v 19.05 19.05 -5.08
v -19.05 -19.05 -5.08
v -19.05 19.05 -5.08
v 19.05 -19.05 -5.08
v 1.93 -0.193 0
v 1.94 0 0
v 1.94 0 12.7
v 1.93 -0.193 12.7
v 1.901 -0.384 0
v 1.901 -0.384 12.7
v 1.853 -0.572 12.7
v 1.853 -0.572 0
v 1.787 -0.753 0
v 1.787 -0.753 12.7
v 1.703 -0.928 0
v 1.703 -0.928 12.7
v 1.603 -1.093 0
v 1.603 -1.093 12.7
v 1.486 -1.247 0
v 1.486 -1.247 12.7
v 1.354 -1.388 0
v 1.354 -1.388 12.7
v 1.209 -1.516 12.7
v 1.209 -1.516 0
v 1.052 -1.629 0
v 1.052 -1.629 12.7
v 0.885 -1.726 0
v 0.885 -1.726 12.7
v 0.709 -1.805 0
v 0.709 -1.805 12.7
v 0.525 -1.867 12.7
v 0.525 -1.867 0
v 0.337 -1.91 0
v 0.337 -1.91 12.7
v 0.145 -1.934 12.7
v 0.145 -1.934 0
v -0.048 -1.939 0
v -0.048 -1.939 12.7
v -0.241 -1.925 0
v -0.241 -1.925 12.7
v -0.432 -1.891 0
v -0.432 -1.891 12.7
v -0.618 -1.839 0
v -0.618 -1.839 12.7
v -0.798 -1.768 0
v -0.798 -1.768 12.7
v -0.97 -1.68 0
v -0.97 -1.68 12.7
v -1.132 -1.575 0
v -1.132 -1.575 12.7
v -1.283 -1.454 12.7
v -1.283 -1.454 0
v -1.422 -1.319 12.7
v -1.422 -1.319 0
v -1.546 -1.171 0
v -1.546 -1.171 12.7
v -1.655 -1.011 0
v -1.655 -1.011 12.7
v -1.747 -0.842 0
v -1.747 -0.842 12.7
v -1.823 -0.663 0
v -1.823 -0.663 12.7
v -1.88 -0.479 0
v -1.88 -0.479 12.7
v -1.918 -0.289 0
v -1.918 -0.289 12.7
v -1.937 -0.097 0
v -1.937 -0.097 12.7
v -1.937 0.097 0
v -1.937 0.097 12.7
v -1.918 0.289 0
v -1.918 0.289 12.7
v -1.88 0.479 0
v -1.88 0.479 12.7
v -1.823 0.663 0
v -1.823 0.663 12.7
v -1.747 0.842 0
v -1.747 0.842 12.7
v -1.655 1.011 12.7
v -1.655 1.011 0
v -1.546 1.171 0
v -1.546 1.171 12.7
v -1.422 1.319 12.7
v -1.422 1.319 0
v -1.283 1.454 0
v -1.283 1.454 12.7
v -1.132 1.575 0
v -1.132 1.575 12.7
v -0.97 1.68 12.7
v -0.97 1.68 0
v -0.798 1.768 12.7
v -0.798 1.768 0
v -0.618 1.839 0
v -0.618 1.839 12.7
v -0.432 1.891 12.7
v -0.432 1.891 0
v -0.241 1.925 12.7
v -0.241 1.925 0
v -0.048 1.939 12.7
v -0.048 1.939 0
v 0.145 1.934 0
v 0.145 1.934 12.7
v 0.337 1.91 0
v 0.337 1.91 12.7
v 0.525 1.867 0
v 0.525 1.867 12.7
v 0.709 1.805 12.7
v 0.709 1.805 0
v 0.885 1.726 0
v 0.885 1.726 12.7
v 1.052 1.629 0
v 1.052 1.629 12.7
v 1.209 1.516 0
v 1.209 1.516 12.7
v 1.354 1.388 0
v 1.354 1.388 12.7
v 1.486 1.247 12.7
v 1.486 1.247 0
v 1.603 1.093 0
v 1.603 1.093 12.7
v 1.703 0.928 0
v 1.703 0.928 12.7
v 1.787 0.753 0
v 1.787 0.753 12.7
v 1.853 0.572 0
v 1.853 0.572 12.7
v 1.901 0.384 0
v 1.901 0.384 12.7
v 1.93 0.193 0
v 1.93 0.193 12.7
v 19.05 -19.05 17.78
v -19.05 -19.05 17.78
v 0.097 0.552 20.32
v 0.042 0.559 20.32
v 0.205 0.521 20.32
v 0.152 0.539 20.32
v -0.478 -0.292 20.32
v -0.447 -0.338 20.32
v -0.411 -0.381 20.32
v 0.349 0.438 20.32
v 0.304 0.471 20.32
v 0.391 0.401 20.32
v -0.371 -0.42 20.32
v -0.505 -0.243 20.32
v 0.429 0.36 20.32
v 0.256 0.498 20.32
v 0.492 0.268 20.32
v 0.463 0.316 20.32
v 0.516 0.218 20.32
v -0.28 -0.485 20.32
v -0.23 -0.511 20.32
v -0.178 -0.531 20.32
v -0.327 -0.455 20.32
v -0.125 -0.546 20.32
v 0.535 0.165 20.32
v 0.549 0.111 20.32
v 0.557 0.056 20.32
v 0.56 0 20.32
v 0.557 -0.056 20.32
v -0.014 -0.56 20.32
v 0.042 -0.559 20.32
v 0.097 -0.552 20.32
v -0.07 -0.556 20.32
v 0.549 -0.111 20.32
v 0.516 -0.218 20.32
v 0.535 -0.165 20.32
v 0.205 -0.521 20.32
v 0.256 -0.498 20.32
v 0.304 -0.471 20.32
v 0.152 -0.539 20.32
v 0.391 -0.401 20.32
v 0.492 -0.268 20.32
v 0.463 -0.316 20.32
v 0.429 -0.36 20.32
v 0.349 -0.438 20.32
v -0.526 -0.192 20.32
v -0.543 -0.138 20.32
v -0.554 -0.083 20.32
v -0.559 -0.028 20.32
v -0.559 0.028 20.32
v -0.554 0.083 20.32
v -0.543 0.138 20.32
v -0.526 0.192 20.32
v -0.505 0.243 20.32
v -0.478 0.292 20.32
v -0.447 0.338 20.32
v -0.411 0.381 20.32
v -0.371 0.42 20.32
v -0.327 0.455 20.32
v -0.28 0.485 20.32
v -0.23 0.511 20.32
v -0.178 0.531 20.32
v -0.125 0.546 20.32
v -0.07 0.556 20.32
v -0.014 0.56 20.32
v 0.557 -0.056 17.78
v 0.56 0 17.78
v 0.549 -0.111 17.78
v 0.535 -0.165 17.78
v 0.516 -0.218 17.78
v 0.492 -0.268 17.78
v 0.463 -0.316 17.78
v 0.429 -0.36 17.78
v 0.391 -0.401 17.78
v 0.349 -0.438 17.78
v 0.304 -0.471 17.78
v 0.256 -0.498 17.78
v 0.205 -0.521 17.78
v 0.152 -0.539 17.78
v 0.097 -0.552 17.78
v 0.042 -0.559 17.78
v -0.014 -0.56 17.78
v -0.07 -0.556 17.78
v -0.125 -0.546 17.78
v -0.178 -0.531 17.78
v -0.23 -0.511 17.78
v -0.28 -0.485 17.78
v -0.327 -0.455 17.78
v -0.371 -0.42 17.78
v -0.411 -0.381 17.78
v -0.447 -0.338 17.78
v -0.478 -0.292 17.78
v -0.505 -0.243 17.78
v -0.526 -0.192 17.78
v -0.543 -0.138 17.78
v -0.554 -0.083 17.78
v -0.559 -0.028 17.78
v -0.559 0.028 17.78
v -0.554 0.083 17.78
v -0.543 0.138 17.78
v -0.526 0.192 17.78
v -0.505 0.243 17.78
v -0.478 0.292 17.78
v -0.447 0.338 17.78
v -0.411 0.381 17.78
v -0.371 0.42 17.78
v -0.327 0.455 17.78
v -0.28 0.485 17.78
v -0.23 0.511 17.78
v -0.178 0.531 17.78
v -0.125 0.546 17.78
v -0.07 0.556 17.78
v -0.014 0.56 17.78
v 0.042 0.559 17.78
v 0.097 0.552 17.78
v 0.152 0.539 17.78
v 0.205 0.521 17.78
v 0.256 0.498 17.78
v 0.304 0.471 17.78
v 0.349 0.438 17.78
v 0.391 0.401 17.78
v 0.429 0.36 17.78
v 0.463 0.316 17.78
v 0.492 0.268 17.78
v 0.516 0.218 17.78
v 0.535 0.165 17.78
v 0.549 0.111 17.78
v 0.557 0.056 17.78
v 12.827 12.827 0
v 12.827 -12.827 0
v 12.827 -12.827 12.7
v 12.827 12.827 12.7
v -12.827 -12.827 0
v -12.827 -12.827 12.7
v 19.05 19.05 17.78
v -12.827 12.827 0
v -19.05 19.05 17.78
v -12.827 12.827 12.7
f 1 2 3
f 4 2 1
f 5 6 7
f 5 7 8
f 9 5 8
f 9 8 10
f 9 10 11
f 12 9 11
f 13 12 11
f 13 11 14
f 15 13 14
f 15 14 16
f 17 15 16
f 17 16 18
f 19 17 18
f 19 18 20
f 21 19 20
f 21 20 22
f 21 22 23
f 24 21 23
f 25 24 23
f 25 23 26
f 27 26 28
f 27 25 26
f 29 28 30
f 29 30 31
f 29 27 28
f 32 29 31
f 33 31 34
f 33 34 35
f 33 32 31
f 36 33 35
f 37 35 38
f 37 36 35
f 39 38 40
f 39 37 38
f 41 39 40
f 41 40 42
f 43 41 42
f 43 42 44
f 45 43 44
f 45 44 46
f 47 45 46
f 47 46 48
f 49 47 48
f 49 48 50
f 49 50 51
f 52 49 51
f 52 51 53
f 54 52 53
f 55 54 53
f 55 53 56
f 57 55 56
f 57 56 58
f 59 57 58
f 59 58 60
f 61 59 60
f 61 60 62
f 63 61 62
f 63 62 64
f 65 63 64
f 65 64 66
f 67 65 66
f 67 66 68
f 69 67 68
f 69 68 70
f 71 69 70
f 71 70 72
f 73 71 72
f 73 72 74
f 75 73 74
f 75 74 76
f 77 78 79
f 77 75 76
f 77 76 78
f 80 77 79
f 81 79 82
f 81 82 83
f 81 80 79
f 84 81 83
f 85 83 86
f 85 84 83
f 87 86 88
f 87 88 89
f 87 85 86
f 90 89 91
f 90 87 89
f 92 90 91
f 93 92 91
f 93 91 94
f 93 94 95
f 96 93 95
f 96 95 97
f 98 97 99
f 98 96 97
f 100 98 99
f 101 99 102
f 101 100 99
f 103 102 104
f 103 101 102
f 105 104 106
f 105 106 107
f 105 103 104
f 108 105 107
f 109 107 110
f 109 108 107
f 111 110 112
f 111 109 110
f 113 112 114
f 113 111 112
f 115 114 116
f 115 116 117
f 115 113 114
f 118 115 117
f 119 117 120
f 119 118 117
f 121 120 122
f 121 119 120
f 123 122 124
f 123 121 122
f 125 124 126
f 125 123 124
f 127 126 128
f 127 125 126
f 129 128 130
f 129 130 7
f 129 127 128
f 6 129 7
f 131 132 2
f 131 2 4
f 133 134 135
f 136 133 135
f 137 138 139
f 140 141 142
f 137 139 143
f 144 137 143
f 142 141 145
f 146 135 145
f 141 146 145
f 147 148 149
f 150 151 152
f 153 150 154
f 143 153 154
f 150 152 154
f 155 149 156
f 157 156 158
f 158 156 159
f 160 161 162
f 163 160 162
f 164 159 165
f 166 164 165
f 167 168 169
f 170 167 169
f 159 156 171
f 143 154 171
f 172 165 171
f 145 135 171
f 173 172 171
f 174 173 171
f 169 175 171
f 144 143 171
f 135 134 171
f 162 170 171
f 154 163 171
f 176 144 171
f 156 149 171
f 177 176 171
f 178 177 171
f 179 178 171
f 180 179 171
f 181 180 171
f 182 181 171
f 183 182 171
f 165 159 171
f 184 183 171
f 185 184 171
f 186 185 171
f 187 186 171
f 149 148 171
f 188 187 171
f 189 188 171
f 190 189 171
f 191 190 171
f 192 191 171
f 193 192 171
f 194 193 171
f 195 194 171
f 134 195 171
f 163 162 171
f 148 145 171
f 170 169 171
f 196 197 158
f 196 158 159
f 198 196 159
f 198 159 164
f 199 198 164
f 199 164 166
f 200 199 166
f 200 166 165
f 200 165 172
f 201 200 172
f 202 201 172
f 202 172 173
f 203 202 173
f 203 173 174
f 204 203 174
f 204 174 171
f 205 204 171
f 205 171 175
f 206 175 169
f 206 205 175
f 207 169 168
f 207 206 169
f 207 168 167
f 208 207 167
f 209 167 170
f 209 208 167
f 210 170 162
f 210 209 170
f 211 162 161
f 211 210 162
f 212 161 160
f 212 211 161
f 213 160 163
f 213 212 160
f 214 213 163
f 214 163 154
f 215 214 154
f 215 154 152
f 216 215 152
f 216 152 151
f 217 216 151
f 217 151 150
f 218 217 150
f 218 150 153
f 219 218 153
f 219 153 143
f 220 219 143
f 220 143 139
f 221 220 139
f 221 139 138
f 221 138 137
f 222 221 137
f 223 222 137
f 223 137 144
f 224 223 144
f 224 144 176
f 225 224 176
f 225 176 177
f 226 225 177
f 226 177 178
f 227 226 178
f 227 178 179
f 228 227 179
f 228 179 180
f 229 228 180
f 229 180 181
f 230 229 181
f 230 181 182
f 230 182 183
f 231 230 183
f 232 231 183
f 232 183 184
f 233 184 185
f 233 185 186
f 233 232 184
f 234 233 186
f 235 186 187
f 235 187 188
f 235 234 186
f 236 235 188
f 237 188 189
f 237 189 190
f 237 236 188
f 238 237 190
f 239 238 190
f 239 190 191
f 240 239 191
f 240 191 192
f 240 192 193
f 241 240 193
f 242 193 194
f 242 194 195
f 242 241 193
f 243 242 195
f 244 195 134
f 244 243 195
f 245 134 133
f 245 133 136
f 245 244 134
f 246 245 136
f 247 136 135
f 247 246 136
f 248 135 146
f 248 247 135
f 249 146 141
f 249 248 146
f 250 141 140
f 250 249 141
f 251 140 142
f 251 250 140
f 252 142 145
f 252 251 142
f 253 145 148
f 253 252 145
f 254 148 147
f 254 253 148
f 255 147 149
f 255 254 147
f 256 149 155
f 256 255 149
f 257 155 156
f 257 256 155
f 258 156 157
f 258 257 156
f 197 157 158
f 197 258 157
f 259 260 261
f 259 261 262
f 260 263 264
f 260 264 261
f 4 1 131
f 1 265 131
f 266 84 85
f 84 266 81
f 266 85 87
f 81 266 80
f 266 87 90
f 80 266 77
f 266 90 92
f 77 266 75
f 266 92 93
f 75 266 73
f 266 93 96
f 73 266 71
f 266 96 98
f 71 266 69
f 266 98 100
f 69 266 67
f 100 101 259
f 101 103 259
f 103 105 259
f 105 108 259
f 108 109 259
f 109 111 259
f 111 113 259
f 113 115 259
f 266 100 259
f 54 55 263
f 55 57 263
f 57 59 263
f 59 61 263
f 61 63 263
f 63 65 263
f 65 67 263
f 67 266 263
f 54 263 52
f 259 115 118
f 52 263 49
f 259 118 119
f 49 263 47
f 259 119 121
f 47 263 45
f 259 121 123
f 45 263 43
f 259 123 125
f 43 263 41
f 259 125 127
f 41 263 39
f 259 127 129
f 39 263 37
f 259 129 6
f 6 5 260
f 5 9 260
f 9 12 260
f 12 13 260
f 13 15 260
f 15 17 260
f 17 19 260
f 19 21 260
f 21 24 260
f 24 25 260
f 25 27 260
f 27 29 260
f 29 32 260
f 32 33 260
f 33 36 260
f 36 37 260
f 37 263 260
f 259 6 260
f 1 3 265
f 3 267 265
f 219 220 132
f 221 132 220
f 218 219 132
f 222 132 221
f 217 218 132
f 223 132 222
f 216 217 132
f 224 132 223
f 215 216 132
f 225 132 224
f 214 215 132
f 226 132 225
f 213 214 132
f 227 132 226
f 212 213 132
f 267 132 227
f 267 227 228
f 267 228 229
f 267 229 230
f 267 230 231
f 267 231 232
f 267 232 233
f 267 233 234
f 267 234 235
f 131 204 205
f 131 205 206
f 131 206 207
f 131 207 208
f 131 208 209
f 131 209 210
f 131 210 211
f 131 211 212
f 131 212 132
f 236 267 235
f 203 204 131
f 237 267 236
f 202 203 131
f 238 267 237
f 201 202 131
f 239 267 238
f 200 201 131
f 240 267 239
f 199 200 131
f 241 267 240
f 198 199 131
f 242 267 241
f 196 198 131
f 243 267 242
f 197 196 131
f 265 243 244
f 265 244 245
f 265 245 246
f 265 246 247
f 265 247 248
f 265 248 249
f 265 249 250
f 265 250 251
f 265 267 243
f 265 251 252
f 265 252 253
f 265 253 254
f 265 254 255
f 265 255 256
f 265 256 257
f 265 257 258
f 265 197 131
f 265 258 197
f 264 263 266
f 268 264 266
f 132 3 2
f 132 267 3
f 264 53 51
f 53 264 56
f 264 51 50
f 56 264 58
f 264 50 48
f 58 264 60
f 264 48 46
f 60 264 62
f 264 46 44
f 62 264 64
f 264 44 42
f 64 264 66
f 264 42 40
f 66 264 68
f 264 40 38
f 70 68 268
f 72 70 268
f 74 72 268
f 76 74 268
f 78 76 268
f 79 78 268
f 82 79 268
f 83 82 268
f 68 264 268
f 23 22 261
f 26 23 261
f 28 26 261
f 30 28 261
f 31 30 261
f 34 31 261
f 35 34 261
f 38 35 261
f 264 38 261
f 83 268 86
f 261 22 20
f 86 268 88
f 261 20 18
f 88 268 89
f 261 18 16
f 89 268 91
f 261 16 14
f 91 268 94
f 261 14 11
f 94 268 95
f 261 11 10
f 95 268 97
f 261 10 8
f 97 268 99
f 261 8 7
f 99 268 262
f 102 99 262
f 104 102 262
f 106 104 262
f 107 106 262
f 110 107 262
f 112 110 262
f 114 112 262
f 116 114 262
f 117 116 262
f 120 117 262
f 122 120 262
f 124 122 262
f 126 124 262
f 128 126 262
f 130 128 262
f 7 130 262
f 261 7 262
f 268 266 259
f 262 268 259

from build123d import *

# Parameters (mm, degrees)
F0_W      = 38.1
F0_H      = 38.1
F1_DEPTH  = 12.7
F2_W      = 25.654
F2_H      = 25.654
F3_DEPTH  = 12.7
F4_W      = 38.1
F4_H      = 38.1
F5_DEPTH  = 5.08
F6_W      = 38.1
F6_H      = 38.1
F7_DEPTH  = 5.08
F8_R      = 1.939554
F9_DEPTH  = 22.606
F10_R     = 0.53889
F11_DEPTH = 25.4
F12_R     = 0.560167
F13_DEPTH = 25.4


with BuildPart() as f1:
    # F0 (on Top) → F1 (new body)
    with BuildSketch(Plane.XY):
        Rectangle(F0_W, F0_H)
    extrude(amount=F1_DEPTH)

    # F2 (on Top) → F3 (cut)
    with BuildSketch(Plane.XY):
        Rectangle(F2_W, F2_H)
    extrude(amount=F3_DEPTH, mode=Mode.SUBTRACT)

    # F4 (on face) → F5 (join)
    with BuildSketch(Plane.XY.offset(12.7)):
        Rectangle(F4_W, F4_H)
    extrude(amount=F5_DEPTH)

    # F6 (on face) → F7 (join)
    with BuildSketch(Plane(origin=(0, 0, 0), x_dir=(1, 0, 0), z_dir=(0, 0, -1))):
        Rectangle(F6_W, F6_H)
    extrude(amount=F7_DEPTH)

    # F8 (on face) → F9 (join)
    with BuildSketch(Plane(origin=(0, 0, -5.08), x_dir=(1, 0, 0), z_dir=(0, 0, -1))):
        Circle(F8_R)
    extrude(amount=-F9_DEPTH)

    # F10 (on face) → F11 (cut)
    with BuildSketch(Plane(origin=(0, 0, -5.08), x_dir=(1, 0, 0), z_dir=(0, 0, -1))):
        Circle(F10_R)
    extrude(amount=-F11_DEPTH, mode=Mode.SUBTRACT)

    # F12 (on face) → F13 (join)
    with BuildSketch(Plane(origin=(0, 0, -5.08), x_dir=(1, 0, 0), z_dir=(0, 0, -1))):
        Circle(F12_R)
    extrude(amount=-F13_DEPTH)


solid = f1.part
